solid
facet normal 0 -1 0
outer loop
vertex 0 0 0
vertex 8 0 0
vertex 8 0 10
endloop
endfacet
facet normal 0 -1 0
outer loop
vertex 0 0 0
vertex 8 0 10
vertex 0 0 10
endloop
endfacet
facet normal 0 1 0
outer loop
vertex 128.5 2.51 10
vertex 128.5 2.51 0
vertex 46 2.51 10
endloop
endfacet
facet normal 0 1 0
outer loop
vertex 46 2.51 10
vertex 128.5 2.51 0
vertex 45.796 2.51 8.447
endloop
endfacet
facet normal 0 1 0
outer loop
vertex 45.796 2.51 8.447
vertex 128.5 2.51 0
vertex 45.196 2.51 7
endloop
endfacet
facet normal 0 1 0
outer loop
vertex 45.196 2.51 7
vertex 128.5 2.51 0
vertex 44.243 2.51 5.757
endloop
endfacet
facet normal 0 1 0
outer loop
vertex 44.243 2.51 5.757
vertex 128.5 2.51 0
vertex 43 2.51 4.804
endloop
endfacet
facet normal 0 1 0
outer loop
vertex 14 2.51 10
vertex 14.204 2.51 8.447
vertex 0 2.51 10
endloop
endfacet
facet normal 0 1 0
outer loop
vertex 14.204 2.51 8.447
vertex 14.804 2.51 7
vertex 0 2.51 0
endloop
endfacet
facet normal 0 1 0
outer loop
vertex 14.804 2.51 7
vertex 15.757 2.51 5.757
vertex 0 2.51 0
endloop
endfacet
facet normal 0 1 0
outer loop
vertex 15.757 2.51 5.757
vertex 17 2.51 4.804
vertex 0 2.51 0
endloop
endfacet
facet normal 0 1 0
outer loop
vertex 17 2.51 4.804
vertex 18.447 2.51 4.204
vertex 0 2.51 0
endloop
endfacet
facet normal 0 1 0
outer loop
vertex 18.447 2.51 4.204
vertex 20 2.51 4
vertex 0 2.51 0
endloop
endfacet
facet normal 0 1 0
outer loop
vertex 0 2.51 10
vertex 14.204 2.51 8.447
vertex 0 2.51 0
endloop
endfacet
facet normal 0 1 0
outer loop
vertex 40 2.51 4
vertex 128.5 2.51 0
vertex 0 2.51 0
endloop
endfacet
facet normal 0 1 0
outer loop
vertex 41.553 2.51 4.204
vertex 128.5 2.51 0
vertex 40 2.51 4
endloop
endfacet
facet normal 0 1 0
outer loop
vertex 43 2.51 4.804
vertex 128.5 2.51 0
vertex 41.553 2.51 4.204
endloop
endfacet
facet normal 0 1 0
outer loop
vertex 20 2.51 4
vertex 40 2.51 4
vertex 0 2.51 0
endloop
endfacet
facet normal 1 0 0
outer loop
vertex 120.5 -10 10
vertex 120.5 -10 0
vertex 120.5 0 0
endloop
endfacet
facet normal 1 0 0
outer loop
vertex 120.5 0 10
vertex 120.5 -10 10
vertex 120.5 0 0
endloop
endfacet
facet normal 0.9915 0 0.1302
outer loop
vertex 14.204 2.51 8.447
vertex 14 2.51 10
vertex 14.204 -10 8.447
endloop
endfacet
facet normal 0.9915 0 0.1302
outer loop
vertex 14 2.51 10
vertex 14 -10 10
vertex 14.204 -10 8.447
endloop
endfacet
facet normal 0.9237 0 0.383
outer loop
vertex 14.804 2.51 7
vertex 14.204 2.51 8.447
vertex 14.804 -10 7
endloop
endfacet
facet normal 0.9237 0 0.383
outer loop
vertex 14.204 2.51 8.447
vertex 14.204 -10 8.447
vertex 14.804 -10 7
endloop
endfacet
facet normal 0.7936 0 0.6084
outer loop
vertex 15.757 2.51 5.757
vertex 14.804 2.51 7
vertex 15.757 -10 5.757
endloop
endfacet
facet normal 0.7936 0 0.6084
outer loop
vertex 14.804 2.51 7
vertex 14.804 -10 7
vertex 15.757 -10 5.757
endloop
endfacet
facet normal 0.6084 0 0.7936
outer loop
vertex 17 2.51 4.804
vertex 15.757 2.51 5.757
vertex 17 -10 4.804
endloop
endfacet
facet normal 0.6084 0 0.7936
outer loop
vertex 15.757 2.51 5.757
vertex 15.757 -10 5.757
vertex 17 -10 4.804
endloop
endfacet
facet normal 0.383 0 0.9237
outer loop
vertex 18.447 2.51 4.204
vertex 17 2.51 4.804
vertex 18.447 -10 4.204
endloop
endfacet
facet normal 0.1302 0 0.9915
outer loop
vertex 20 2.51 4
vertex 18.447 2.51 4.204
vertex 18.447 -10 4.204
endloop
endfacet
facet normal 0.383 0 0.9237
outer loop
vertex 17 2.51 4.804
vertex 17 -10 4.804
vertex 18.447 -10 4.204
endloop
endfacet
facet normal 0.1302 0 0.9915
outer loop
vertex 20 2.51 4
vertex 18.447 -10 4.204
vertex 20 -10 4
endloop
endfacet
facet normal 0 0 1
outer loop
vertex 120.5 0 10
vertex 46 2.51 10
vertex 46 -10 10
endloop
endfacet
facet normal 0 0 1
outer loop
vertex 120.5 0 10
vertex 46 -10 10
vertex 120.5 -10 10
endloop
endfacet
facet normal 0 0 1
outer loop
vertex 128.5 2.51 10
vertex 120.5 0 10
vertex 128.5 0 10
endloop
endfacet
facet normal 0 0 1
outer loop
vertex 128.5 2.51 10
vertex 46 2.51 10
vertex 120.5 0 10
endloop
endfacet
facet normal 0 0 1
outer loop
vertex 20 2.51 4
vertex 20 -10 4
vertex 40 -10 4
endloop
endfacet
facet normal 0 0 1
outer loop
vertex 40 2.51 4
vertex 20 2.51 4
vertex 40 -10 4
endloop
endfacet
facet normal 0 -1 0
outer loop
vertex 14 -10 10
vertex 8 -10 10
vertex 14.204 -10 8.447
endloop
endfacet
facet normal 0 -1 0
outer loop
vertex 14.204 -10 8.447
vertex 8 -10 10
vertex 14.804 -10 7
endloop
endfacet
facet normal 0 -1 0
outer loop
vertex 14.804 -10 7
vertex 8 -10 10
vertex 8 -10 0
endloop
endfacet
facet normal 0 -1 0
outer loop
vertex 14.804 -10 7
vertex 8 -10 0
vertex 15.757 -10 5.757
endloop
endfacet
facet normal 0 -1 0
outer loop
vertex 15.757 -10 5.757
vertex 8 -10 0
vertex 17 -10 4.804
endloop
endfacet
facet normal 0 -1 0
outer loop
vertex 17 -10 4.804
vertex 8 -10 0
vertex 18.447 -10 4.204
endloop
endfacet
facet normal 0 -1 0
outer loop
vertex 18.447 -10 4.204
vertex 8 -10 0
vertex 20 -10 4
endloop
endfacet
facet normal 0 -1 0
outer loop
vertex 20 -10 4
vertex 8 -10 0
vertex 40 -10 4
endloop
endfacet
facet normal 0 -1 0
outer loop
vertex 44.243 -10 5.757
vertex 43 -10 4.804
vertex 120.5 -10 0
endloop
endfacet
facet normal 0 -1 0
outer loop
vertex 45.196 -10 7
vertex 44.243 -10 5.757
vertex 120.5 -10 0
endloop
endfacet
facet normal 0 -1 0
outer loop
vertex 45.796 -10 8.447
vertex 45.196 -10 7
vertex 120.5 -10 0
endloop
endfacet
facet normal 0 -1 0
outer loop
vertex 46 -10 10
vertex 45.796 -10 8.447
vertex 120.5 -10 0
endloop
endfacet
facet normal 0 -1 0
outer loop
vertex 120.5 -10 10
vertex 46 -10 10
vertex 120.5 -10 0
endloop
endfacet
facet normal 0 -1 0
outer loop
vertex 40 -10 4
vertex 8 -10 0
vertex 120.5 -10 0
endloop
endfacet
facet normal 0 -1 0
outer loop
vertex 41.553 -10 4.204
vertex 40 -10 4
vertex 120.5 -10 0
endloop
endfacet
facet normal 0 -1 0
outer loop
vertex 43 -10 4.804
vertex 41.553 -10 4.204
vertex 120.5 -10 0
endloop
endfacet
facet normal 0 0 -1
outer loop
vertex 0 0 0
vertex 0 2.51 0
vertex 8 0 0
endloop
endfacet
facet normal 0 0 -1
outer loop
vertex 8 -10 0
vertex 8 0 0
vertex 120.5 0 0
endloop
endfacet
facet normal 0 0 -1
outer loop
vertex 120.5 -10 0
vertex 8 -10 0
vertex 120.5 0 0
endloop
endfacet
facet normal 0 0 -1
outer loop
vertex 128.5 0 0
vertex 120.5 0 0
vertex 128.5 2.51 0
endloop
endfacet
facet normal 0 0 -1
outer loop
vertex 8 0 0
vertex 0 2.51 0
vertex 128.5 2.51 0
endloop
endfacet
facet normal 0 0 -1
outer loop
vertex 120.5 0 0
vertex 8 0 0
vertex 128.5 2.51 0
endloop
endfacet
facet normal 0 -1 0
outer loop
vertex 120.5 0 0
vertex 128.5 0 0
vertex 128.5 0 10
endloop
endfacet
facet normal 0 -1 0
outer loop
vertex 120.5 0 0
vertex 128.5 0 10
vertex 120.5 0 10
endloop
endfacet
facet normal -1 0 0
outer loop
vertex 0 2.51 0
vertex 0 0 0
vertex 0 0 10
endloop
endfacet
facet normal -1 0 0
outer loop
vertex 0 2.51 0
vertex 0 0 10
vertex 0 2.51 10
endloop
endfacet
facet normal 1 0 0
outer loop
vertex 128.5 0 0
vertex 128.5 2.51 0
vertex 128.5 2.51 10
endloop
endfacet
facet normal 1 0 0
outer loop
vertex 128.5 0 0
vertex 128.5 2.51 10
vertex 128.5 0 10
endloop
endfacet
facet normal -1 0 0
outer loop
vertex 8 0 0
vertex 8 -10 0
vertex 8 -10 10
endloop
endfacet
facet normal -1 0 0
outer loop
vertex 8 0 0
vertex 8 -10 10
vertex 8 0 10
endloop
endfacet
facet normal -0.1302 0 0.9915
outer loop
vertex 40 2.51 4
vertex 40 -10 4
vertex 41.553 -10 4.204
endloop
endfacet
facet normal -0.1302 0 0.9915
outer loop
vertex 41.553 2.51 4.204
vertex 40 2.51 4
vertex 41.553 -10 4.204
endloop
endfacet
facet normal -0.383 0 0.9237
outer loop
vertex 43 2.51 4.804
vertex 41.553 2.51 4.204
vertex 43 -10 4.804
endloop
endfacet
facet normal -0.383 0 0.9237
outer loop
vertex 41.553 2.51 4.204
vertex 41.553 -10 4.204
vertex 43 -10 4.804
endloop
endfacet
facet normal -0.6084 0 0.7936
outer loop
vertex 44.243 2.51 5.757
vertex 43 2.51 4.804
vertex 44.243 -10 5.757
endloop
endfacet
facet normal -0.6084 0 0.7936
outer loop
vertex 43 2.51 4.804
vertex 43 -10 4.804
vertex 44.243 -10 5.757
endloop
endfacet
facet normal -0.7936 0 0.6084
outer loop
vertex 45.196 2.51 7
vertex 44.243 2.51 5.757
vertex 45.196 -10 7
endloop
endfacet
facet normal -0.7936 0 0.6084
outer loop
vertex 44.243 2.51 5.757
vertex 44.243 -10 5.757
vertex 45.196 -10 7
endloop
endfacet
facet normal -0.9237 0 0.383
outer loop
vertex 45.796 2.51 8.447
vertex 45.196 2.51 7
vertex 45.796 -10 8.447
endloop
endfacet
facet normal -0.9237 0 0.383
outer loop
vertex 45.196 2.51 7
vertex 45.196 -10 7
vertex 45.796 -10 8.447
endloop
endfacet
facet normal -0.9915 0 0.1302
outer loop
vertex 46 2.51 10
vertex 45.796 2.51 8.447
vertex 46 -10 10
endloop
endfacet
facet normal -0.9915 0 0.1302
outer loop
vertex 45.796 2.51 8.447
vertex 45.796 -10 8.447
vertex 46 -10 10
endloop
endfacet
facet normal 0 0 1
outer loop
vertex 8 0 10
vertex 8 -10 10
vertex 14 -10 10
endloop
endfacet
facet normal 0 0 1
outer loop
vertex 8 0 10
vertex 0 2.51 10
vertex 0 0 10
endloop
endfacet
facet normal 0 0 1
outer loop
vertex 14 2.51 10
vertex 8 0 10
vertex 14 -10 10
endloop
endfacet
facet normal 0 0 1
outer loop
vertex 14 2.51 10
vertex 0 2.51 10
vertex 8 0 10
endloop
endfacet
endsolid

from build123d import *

# Parameters (mm, degrees)
PAD_DEPTH    = 10
SKETCH001_W  = 112.5
SKETCH001_H  = 11
PAD001_DEPTH = 10
POCKET_DEPTH = 10.5


with BuildPart() as part:
    # Sketch → Pad (new body)
    with BuildSketch(Plane.XY):
        Polygon((0, 0), (0, 2.51), (5, 2.51), (123.5, 2.51), (128.5, 2.51), (128.5, 0), align=None)
    extrude(amount=PAD_DEPTH)

    # Sketch001 → Pad001 (join)
    with BuildSketch(Plane.XY):
        with Locations((64.25, -4.5)):
            Rectangle(SKETCH001_W, SKETCH001_H)
    extrude(amount=PAD001_DEPTH)

    # Sketch002 → Pocket (cut, symmetric)
    with BuildSketch(Plane.XZ):
        with BuildLine():
            ThreePointArc((20, 16), (14, 10), (20, 4))
            Line((20, 4), (40, 4))
            ThreePointArc((40, 4), (46, 10), (40, 16))
            Line((40, 16), (20, 16))
        make_face()
    extrude(amount=POCKET_DEPTH, both=True, mode=Mode.SUBTRACT)


solid = part.part
